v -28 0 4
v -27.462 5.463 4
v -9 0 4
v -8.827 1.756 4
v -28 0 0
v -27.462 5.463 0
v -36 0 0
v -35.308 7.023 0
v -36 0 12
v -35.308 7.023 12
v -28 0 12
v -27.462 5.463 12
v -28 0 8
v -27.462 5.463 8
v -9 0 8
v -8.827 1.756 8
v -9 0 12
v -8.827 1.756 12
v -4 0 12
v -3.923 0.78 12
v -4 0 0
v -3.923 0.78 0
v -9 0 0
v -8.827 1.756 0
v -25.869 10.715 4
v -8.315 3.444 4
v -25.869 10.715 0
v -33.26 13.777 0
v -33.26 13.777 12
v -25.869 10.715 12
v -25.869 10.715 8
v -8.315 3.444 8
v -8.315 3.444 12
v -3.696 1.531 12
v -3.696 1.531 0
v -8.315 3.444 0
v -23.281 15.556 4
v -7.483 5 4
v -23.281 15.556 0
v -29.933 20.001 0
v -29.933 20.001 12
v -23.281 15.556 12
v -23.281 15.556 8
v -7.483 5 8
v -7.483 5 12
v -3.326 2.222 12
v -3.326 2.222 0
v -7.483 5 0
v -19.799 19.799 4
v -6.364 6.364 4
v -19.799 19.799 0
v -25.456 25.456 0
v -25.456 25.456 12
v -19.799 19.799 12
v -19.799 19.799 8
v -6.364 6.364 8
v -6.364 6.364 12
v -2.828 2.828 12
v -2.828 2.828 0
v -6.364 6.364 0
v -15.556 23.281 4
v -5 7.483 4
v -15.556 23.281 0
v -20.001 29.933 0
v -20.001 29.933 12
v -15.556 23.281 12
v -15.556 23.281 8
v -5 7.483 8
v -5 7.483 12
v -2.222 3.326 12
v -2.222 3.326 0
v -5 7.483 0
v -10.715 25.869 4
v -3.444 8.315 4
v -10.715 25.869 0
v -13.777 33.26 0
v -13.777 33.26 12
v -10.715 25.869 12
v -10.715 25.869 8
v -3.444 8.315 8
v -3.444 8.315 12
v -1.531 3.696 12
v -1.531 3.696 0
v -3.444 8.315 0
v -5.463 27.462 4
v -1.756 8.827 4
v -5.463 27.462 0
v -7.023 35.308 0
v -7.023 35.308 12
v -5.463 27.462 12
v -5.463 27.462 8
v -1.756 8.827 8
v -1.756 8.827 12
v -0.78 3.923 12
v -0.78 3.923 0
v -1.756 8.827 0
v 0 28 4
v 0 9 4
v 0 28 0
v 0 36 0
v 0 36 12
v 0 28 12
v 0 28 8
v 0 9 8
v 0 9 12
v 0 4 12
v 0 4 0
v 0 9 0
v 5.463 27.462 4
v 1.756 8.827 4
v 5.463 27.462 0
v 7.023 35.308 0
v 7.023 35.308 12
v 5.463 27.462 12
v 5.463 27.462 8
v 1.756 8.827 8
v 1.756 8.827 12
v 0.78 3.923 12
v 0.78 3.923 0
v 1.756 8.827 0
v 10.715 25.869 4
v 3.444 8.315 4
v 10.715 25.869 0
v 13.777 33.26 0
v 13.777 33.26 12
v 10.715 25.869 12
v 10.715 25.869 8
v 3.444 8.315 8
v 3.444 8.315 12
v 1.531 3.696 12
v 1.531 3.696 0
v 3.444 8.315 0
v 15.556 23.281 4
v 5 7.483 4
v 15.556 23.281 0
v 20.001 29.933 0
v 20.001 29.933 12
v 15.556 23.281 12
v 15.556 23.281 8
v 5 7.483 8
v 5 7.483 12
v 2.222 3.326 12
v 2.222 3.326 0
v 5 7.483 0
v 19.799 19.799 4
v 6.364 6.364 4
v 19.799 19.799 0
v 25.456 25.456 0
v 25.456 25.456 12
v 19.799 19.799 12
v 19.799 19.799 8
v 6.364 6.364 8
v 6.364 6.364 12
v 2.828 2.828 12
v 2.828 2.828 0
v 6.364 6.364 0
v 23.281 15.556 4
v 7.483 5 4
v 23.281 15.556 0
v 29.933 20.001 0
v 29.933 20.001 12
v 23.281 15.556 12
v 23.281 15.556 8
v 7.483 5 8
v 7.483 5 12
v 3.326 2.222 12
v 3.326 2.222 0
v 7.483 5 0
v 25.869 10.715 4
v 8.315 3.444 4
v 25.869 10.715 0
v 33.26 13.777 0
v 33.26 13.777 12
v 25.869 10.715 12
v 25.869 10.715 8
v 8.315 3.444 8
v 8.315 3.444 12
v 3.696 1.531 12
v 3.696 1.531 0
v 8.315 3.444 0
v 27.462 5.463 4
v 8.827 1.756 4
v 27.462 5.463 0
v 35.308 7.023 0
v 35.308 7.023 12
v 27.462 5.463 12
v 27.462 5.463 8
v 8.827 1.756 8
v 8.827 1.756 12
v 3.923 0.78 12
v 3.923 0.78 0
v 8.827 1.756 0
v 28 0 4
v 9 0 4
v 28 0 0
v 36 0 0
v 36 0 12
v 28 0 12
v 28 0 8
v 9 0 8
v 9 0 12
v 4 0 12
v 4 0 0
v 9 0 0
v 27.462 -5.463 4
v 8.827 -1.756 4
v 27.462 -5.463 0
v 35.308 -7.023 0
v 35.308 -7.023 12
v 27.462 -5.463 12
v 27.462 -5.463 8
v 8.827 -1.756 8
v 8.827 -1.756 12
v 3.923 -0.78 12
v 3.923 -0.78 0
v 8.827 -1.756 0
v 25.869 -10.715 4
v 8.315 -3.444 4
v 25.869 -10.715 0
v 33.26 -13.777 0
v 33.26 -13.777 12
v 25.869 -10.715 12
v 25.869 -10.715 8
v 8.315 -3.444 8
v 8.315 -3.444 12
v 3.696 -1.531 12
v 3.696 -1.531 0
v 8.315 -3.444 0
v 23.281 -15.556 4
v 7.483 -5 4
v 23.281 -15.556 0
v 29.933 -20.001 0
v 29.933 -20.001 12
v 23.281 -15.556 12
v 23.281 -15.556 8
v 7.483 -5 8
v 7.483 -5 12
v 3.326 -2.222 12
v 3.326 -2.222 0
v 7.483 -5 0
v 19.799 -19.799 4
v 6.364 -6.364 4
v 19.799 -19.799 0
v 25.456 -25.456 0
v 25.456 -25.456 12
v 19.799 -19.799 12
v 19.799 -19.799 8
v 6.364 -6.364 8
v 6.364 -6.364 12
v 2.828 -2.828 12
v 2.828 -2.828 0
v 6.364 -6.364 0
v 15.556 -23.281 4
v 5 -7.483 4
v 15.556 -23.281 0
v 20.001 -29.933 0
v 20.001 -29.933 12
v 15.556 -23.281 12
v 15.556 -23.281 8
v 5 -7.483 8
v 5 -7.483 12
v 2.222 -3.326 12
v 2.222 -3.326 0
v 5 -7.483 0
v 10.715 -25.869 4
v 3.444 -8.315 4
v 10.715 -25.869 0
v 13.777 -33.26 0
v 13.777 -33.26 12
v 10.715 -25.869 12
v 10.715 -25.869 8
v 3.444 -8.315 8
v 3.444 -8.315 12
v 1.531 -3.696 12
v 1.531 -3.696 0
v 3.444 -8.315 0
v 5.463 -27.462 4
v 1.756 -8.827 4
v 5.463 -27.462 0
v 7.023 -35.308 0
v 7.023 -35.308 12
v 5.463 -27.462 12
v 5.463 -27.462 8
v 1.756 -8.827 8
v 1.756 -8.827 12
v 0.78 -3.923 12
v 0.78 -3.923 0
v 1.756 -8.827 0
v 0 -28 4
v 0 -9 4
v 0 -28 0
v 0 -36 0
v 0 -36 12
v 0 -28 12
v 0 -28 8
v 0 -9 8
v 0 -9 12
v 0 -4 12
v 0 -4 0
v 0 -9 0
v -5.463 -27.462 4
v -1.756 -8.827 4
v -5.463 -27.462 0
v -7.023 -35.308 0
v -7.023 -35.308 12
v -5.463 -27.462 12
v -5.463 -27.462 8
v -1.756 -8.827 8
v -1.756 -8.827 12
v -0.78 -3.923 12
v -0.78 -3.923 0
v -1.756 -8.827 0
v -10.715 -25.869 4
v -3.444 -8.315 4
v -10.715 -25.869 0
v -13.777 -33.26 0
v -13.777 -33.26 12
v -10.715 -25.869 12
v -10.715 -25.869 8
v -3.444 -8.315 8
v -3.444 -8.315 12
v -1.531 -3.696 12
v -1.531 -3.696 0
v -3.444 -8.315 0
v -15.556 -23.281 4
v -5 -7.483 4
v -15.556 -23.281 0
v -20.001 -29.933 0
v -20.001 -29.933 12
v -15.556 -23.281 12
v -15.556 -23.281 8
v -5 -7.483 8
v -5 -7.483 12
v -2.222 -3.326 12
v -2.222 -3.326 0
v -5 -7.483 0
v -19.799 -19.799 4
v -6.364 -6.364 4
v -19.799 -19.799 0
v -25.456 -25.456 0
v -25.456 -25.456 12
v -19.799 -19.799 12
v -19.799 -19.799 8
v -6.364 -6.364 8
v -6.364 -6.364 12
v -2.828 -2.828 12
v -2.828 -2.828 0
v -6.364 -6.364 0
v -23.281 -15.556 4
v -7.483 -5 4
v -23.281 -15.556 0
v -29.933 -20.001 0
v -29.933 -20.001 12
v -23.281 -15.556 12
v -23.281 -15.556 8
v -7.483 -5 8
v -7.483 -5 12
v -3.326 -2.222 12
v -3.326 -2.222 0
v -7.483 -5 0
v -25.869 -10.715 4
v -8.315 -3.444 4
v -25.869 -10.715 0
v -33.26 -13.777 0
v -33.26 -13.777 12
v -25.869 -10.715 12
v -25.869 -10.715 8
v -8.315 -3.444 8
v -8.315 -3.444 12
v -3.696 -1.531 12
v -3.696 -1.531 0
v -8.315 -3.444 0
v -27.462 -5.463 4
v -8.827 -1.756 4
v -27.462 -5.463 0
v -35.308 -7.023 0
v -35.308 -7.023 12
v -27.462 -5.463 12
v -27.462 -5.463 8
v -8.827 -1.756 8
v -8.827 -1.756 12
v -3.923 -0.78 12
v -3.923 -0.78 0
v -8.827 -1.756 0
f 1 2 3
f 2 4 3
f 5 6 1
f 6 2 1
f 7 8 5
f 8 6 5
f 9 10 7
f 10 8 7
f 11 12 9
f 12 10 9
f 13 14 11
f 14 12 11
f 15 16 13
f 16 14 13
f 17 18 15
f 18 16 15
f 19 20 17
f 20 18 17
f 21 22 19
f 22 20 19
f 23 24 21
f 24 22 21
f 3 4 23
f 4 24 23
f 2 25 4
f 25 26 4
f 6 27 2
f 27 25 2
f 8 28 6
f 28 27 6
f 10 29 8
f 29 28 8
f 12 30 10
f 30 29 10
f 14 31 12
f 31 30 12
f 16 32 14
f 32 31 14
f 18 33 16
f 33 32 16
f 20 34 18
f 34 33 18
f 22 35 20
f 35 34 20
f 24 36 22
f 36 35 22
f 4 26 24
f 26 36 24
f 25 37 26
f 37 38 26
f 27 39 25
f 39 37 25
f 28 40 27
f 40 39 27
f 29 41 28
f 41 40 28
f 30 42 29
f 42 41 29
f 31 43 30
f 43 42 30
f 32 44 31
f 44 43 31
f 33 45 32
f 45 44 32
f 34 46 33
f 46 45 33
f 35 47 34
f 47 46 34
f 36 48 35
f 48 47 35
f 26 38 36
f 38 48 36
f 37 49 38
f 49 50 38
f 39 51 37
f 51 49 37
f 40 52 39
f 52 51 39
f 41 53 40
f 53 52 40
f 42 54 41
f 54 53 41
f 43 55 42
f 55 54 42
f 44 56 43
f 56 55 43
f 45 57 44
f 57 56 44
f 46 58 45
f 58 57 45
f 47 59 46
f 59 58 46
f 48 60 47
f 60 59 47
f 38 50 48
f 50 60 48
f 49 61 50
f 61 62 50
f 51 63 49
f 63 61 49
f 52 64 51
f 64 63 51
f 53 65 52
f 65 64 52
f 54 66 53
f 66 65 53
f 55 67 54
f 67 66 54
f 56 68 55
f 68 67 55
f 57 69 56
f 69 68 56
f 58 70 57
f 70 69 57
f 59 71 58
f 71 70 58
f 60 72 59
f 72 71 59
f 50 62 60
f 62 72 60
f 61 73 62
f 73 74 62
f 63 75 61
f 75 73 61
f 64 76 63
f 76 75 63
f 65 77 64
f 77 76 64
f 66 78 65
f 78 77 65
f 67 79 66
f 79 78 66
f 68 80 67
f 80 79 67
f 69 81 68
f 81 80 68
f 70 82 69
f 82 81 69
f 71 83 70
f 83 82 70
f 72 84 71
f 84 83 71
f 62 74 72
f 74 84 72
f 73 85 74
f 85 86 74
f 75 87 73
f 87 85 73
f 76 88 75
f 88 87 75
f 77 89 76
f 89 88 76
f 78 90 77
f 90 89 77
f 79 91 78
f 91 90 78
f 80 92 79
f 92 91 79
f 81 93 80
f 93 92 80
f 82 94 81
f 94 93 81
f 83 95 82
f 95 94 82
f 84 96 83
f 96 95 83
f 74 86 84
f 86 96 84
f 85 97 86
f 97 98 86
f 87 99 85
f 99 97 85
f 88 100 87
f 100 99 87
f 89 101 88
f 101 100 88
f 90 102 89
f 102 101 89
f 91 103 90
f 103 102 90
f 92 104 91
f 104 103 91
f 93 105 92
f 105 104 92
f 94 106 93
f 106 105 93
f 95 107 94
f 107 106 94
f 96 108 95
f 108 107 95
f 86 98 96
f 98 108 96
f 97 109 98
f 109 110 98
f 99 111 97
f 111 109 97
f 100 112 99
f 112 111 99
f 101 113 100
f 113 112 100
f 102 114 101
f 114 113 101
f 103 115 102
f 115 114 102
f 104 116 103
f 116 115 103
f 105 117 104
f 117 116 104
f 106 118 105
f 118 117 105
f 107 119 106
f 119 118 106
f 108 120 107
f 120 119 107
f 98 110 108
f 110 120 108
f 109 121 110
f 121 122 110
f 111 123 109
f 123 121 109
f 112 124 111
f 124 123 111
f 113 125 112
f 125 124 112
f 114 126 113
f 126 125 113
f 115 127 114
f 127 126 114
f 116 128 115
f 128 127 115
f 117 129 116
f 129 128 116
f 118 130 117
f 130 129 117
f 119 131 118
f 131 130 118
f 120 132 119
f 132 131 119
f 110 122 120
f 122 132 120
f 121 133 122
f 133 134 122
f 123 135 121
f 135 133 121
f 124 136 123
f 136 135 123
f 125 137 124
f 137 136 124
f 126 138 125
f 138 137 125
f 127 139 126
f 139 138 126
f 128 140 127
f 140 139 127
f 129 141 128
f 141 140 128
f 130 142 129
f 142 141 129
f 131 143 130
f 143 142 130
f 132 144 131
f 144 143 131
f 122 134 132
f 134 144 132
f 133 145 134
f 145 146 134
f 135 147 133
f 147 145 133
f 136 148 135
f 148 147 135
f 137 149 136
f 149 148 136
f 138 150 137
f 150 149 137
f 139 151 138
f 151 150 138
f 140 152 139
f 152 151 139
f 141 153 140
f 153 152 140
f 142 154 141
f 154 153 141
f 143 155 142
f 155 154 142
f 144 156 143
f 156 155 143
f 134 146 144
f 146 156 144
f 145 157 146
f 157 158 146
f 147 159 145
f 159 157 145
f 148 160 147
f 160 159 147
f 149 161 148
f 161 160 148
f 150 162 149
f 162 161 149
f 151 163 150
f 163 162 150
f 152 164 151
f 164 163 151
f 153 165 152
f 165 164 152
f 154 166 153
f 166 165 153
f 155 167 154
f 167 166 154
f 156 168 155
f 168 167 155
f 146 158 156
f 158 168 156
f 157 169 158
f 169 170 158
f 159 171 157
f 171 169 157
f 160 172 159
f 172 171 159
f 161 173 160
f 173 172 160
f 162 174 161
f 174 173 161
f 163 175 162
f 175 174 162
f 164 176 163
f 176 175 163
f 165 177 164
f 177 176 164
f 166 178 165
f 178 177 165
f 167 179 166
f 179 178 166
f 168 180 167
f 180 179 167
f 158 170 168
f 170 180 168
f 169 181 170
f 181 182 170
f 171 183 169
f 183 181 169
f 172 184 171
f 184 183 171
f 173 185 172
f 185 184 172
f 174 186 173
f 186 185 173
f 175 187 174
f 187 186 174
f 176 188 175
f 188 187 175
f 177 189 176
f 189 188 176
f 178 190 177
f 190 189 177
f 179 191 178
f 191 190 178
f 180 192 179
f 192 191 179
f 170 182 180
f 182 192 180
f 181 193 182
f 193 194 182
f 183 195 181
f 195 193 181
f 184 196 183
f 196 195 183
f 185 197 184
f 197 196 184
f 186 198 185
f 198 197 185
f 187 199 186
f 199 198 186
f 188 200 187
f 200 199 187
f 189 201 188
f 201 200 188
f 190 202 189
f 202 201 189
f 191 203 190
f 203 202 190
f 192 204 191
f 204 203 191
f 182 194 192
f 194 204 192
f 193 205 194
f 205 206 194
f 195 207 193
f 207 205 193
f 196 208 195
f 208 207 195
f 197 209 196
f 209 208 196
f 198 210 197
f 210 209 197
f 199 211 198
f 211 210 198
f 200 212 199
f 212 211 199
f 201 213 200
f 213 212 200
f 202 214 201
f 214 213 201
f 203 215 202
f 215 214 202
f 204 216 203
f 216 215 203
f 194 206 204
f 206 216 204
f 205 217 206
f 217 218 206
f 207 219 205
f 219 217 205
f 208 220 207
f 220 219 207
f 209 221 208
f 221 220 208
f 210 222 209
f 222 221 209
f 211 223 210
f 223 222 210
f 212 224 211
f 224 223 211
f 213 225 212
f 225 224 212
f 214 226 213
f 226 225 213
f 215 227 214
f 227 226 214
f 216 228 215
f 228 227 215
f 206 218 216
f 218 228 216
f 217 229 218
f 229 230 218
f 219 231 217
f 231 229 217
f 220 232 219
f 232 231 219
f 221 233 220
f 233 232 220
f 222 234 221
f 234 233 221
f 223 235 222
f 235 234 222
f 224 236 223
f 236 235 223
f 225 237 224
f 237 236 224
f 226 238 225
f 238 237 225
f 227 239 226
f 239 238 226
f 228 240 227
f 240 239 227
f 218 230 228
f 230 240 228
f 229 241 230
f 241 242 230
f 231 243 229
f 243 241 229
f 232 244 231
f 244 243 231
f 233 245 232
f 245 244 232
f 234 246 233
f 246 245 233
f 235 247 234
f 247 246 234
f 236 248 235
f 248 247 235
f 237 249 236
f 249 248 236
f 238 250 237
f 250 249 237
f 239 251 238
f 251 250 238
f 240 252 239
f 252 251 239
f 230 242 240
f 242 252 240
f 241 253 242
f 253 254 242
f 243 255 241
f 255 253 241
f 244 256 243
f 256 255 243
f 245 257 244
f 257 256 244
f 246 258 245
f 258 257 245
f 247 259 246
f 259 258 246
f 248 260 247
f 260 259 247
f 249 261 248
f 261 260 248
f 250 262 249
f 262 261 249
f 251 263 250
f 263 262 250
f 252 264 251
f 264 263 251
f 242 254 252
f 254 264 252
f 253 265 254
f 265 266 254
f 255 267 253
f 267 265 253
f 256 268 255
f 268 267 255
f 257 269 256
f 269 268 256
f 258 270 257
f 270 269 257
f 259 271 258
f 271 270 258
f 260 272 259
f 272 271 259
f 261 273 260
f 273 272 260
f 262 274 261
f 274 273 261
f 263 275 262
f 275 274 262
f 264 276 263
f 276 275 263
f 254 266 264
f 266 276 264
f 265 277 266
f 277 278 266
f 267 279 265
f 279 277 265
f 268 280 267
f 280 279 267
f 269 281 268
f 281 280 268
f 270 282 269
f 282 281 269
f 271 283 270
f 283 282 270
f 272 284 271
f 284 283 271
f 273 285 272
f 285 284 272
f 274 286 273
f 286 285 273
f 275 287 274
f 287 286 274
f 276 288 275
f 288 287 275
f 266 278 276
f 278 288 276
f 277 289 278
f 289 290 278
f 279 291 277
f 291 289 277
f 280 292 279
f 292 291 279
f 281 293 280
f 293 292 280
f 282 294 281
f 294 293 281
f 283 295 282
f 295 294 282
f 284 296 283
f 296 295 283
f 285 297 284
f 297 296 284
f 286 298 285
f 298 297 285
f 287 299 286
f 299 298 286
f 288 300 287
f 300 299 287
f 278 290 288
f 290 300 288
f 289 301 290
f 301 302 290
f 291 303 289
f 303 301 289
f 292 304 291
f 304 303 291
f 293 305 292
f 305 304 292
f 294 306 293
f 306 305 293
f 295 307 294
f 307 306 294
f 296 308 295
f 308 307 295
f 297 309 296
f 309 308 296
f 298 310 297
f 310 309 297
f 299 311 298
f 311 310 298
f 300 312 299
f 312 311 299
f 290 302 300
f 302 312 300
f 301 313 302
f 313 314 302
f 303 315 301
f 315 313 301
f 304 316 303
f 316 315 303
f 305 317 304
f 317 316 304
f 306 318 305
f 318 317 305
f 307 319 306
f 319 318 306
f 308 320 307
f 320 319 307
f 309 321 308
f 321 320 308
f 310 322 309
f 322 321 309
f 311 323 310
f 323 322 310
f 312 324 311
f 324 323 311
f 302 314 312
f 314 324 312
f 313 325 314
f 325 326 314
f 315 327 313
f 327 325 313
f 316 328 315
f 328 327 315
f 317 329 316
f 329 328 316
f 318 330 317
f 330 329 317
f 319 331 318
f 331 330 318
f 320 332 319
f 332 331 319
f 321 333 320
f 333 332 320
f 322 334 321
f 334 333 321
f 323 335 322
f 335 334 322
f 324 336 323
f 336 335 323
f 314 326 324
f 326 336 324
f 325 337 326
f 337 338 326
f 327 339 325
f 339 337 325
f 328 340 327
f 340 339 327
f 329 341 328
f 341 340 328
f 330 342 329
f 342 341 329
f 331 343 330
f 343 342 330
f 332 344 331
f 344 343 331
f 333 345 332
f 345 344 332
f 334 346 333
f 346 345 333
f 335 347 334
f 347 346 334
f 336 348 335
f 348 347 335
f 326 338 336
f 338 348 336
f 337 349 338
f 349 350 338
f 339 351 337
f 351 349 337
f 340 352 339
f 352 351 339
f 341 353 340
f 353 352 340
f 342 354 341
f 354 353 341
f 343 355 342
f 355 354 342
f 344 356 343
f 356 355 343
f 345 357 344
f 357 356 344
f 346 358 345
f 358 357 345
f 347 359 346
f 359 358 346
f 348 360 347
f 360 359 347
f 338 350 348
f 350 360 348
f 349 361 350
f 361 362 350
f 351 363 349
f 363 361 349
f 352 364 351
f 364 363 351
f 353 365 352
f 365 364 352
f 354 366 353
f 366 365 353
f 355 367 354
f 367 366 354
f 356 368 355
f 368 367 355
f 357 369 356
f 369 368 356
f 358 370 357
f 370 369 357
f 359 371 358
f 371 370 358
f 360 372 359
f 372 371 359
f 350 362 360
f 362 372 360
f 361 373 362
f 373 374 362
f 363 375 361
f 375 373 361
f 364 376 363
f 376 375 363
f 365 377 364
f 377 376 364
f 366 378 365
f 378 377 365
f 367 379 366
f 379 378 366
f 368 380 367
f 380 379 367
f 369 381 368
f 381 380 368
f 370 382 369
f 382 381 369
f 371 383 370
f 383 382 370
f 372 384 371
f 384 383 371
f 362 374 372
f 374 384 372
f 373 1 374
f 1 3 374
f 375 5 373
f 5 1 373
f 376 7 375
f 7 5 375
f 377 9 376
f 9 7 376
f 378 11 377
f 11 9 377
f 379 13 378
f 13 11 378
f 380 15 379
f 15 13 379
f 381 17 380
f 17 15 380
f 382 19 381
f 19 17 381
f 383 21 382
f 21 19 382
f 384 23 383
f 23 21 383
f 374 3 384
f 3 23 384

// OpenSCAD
$fn = 32;

// ----------------------------------------------------------------------
// Revolved part: handwheel R36
// ----------------------------------------------------------------------

// --- parameters (mm) ---
bore_r = 4;               // bore radius
rim_r = 36;               // rim radius
rim_w = 8;                // rim axial width
rim_t = 12;               // rim diameter height
hub_r = 9;                // hub radius
web_t = 4;                // web thickness
revolve_angle = 360;      // revolve sweep, degrees

bore_d = 2 * bore_r;
rim_d = 2 * rim_r;
hub_d = 2 * hub_r;

profile = [[4, 0], [9, 0], [9, 4], [28, 4], [28, 0], [36, 0], [36, 12], [28, 12], [28, 8], [9, 8], [9, 12], [4, 12]];  // primary outline, 12 points, counter clockwise

// --- the one profile operation ---
rotate_extrude(angle = revolve_angle) polygon(points = profile);
